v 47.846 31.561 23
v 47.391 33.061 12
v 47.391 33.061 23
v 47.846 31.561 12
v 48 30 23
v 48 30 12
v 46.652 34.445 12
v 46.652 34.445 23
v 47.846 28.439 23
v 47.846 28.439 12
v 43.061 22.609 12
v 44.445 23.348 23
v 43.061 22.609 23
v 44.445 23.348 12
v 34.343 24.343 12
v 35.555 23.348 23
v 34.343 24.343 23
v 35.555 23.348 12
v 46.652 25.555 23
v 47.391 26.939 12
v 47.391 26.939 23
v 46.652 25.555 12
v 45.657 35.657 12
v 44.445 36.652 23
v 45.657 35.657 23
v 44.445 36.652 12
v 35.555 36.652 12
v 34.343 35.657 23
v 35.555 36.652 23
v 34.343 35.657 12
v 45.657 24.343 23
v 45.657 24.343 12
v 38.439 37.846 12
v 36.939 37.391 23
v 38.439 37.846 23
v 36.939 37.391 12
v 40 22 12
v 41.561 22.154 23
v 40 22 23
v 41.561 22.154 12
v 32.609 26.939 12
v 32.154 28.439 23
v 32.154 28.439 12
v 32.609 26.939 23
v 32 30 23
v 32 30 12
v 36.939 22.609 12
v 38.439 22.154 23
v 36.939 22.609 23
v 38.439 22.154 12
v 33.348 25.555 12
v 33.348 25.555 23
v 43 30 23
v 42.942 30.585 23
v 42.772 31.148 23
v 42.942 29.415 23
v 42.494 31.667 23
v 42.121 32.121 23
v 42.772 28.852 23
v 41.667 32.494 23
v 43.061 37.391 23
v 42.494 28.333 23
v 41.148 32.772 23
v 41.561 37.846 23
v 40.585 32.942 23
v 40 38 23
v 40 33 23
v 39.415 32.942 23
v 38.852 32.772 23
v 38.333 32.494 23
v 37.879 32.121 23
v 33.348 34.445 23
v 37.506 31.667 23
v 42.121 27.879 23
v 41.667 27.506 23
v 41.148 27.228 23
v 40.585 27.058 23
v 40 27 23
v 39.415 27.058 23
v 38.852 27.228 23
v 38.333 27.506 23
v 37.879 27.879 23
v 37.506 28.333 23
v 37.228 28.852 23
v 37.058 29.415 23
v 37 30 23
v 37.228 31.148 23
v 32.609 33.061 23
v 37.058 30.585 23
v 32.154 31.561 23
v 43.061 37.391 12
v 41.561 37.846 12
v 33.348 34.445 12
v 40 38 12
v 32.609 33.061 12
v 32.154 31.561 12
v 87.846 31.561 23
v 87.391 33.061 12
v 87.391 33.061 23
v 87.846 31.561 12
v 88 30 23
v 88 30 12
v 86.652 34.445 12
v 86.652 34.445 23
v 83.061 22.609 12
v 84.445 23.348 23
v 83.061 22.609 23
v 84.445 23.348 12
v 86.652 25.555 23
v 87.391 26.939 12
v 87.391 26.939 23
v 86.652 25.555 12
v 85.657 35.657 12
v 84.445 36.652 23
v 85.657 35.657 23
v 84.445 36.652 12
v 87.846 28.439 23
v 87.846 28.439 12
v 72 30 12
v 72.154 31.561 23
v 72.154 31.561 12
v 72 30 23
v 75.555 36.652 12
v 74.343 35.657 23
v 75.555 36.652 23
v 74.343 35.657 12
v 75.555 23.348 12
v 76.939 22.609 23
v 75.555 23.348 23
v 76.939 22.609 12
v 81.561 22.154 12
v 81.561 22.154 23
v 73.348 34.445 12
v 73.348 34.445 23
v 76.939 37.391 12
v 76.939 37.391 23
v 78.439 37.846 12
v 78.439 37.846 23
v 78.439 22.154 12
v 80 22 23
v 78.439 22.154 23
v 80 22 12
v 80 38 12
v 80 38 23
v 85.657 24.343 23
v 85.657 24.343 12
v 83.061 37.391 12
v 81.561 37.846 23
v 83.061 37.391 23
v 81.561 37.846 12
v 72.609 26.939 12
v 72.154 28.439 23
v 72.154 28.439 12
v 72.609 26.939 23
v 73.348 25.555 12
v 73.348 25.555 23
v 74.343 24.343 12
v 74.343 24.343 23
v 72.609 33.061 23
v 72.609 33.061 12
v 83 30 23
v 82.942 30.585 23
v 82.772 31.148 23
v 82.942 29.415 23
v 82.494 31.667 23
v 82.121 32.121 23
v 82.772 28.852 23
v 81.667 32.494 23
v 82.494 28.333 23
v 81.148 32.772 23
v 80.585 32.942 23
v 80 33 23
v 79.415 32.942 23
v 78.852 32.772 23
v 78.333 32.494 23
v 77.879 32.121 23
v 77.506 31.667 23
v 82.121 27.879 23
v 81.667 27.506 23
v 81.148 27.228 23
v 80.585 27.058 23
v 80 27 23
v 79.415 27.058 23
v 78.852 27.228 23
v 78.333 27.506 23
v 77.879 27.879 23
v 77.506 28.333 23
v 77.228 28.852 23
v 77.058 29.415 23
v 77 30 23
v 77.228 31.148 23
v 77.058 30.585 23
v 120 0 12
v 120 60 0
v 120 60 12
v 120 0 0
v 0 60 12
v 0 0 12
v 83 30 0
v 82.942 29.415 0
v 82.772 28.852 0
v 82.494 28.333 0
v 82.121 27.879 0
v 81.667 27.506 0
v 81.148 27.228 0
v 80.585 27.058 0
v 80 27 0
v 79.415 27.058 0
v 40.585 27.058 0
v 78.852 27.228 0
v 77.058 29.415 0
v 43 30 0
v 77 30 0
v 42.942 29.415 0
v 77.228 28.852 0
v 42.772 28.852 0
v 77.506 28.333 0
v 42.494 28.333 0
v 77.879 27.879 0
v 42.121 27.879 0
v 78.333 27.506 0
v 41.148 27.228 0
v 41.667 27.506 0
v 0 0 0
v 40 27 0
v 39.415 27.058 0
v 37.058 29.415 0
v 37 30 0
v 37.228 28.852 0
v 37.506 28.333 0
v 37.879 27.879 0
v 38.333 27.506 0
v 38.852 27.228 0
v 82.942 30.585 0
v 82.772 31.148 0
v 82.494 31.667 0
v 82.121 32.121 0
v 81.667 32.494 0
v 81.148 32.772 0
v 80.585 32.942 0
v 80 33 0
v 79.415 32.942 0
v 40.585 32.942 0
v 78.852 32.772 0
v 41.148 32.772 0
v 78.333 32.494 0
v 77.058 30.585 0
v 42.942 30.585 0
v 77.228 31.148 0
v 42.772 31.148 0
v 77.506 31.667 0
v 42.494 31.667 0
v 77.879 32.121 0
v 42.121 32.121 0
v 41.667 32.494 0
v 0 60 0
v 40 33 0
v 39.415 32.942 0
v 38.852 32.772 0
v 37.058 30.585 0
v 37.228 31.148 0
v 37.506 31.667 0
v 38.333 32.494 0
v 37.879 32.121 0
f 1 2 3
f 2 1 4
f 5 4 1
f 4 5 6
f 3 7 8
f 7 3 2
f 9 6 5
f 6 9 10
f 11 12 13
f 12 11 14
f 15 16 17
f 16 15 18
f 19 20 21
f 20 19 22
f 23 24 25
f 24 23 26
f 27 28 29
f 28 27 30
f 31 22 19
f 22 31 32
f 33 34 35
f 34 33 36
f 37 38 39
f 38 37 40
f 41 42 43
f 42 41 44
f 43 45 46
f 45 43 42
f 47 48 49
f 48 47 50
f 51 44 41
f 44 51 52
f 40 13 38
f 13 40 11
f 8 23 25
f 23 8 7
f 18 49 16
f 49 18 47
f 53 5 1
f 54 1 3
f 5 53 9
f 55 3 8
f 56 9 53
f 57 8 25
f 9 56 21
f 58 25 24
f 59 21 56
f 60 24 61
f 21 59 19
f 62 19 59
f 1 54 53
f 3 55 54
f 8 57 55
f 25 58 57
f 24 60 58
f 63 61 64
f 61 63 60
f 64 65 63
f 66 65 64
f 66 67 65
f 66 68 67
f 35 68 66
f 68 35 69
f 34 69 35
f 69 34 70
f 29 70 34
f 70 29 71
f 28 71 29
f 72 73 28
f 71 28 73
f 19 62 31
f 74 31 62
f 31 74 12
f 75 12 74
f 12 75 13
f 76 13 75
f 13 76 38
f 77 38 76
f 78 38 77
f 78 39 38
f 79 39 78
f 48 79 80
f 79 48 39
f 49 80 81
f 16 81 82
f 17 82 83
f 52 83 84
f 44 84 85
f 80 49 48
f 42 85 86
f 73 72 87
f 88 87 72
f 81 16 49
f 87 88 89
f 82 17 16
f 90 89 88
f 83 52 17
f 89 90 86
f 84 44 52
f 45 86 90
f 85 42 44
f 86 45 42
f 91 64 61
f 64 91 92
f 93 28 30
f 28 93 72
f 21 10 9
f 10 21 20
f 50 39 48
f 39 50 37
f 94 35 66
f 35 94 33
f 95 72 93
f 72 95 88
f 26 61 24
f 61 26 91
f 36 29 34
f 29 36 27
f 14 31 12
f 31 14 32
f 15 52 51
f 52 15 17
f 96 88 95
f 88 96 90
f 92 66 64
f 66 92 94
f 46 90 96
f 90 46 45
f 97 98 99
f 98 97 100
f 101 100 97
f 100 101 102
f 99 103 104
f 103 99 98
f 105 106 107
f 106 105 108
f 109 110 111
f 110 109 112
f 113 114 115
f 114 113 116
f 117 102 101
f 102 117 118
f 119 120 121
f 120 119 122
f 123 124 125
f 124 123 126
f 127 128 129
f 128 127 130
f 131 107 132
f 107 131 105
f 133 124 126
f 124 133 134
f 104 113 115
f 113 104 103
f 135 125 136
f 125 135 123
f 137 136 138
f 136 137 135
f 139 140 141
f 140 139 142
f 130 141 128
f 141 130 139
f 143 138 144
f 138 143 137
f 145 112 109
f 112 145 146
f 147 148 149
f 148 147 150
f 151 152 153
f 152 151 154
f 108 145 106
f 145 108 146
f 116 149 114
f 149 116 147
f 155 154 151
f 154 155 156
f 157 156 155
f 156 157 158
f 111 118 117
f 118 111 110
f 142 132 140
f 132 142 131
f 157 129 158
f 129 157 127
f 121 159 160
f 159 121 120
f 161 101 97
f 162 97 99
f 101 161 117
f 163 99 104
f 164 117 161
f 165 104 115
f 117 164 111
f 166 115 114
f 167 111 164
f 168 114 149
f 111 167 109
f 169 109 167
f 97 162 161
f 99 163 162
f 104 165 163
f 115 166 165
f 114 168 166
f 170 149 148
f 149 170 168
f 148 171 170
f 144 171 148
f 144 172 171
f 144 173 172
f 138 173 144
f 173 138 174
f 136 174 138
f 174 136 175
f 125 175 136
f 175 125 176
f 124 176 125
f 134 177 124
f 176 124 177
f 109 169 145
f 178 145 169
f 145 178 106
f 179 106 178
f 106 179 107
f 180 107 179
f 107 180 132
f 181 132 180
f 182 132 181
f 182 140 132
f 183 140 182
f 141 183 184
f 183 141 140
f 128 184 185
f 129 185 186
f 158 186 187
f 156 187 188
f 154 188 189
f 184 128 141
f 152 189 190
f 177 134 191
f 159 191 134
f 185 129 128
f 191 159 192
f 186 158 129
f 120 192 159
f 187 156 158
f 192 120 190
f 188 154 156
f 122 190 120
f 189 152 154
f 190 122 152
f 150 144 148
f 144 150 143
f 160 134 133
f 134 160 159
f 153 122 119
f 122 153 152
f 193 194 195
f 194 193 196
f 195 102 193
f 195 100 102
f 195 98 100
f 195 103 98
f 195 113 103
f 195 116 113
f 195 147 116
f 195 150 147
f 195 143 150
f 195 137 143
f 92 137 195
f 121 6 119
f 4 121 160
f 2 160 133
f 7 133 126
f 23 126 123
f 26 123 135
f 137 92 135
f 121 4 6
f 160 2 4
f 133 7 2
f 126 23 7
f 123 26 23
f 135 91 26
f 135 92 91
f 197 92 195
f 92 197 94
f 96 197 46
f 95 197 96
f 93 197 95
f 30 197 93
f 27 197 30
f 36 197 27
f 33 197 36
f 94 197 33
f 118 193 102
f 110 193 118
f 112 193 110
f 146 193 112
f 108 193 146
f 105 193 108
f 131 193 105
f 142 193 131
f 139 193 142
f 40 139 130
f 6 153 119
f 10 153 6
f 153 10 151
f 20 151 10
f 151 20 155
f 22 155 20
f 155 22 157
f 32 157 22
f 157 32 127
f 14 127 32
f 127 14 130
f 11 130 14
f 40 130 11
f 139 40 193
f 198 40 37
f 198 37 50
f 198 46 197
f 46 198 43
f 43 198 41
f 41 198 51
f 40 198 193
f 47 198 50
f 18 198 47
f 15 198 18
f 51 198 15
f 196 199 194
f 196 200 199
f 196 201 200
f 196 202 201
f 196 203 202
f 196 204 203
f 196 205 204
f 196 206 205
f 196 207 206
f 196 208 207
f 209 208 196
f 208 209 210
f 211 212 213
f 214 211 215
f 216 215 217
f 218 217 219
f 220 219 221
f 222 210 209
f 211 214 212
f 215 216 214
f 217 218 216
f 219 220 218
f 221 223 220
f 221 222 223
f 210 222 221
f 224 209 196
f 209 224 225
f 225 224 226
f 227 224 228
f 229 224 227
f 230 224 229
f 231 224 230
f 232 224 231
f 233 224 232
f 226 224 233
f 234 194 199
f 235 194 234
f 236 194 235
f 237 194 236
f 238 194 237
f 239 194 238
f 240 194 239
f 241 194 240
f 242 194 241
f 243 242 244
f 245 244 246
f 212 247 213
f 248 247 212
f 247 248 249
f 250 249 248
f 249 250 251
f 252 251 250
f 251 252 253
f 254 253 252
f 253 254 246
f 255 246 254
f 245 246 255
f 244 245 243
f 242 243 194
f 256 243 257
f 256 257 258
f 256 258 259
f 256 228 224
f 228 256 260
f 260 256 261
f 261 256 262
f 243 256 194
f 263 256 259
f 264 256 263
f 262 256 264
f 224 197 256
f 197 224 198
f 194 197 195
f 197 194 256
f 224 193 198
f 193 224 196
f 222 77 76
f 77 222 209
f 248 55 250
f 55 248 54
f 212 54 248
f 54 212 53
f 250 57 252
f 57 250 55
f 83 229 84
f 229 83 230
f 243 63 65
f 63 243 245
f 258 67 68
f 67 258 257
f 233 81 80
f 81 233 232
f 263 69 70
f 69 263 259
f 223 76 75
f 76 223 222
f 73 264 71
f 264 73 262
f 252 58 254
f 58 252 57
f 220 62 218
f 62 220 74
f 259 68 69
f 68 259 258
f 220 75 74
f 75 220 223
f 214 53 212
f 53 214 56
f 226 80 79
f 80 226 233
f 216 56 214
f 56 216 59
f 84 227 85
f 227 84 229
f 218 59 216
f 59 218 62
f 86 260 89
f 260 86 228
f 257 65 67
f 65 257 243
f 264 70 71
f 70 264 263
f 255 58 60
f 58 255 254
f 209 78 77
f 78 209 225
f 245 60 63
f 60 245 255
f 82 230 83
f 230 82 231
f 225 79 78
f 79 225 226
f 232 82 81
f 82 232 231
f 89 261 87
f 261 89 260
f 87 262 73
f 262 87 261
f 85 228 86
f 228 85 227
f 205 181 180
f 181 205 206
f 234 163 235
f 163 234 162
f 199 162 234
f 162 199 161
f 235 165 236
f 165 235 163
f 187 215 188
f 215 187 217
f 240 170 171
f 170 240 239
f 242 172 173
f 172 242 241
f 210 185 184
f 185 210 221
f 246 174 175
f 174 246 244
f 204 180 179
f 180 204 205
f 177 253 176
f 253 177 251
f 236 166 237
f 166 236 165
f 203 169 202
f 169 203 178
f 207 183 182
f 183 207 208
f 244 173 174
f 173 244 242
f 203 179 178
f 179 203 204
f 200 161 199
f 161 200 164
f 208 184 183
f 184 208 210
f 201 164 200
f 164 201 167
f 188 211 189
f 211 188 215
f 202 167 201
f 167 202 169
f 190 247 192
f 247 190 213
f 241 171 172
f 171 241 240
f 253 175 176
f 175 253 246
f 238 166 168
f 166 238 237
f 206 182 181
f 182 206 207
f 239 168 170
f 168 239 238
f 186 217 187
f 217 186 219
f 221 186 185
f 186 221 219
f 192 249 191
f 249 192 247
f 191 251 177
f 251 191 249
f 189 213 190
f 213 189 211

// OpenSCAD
$fn = 32;

// ----------------------------------------------------------------------
// Drill jig: two_boss jig
// ----------------------------------------------------------------------

// --- parameters (mm) ---
plate_l = 120;            // plate length, X
plate_w = 60;             // plate width, Y
plate_t = 12;             // plate thickness
boss_d = 16;              // guide boss diameter
boss_h = 12;              // boss height above the plate
guide_d = 6;              // guide hole diameter
boss_pitch = 40;          // boss pitch
fit_tol = 0.1;            // tolerance for press fits, mm
free_tol = 0.5;           // tolerance for clearance fits, mm

n_boss = 2;  // guide bosses
boss_x0 = (plate_l - (n_boss - 1) * boss_pitch) / 2;  // first boss X
boss_top = plate_t - 1 + boss_h;  // boss crown height
total_h = boss_top;  // overall height

difference() {
  union() {
  cube([plate_l, plate_w, plate_t]);
  for (i = [0 : n_boss - 1])
    translate([boss_x0 + i * boss_pitch, plate_w / 2, plate_t - 1])
      cylinder(h = boss_h, d = boss_d);
  }
  for (i = [0 : n_boss - 1])
    translate([boss_x0 + i * boss_pitch, plate_w / 2, -1])
      cylinder(h = plate_t + boss_h, d = guide_d);
}
